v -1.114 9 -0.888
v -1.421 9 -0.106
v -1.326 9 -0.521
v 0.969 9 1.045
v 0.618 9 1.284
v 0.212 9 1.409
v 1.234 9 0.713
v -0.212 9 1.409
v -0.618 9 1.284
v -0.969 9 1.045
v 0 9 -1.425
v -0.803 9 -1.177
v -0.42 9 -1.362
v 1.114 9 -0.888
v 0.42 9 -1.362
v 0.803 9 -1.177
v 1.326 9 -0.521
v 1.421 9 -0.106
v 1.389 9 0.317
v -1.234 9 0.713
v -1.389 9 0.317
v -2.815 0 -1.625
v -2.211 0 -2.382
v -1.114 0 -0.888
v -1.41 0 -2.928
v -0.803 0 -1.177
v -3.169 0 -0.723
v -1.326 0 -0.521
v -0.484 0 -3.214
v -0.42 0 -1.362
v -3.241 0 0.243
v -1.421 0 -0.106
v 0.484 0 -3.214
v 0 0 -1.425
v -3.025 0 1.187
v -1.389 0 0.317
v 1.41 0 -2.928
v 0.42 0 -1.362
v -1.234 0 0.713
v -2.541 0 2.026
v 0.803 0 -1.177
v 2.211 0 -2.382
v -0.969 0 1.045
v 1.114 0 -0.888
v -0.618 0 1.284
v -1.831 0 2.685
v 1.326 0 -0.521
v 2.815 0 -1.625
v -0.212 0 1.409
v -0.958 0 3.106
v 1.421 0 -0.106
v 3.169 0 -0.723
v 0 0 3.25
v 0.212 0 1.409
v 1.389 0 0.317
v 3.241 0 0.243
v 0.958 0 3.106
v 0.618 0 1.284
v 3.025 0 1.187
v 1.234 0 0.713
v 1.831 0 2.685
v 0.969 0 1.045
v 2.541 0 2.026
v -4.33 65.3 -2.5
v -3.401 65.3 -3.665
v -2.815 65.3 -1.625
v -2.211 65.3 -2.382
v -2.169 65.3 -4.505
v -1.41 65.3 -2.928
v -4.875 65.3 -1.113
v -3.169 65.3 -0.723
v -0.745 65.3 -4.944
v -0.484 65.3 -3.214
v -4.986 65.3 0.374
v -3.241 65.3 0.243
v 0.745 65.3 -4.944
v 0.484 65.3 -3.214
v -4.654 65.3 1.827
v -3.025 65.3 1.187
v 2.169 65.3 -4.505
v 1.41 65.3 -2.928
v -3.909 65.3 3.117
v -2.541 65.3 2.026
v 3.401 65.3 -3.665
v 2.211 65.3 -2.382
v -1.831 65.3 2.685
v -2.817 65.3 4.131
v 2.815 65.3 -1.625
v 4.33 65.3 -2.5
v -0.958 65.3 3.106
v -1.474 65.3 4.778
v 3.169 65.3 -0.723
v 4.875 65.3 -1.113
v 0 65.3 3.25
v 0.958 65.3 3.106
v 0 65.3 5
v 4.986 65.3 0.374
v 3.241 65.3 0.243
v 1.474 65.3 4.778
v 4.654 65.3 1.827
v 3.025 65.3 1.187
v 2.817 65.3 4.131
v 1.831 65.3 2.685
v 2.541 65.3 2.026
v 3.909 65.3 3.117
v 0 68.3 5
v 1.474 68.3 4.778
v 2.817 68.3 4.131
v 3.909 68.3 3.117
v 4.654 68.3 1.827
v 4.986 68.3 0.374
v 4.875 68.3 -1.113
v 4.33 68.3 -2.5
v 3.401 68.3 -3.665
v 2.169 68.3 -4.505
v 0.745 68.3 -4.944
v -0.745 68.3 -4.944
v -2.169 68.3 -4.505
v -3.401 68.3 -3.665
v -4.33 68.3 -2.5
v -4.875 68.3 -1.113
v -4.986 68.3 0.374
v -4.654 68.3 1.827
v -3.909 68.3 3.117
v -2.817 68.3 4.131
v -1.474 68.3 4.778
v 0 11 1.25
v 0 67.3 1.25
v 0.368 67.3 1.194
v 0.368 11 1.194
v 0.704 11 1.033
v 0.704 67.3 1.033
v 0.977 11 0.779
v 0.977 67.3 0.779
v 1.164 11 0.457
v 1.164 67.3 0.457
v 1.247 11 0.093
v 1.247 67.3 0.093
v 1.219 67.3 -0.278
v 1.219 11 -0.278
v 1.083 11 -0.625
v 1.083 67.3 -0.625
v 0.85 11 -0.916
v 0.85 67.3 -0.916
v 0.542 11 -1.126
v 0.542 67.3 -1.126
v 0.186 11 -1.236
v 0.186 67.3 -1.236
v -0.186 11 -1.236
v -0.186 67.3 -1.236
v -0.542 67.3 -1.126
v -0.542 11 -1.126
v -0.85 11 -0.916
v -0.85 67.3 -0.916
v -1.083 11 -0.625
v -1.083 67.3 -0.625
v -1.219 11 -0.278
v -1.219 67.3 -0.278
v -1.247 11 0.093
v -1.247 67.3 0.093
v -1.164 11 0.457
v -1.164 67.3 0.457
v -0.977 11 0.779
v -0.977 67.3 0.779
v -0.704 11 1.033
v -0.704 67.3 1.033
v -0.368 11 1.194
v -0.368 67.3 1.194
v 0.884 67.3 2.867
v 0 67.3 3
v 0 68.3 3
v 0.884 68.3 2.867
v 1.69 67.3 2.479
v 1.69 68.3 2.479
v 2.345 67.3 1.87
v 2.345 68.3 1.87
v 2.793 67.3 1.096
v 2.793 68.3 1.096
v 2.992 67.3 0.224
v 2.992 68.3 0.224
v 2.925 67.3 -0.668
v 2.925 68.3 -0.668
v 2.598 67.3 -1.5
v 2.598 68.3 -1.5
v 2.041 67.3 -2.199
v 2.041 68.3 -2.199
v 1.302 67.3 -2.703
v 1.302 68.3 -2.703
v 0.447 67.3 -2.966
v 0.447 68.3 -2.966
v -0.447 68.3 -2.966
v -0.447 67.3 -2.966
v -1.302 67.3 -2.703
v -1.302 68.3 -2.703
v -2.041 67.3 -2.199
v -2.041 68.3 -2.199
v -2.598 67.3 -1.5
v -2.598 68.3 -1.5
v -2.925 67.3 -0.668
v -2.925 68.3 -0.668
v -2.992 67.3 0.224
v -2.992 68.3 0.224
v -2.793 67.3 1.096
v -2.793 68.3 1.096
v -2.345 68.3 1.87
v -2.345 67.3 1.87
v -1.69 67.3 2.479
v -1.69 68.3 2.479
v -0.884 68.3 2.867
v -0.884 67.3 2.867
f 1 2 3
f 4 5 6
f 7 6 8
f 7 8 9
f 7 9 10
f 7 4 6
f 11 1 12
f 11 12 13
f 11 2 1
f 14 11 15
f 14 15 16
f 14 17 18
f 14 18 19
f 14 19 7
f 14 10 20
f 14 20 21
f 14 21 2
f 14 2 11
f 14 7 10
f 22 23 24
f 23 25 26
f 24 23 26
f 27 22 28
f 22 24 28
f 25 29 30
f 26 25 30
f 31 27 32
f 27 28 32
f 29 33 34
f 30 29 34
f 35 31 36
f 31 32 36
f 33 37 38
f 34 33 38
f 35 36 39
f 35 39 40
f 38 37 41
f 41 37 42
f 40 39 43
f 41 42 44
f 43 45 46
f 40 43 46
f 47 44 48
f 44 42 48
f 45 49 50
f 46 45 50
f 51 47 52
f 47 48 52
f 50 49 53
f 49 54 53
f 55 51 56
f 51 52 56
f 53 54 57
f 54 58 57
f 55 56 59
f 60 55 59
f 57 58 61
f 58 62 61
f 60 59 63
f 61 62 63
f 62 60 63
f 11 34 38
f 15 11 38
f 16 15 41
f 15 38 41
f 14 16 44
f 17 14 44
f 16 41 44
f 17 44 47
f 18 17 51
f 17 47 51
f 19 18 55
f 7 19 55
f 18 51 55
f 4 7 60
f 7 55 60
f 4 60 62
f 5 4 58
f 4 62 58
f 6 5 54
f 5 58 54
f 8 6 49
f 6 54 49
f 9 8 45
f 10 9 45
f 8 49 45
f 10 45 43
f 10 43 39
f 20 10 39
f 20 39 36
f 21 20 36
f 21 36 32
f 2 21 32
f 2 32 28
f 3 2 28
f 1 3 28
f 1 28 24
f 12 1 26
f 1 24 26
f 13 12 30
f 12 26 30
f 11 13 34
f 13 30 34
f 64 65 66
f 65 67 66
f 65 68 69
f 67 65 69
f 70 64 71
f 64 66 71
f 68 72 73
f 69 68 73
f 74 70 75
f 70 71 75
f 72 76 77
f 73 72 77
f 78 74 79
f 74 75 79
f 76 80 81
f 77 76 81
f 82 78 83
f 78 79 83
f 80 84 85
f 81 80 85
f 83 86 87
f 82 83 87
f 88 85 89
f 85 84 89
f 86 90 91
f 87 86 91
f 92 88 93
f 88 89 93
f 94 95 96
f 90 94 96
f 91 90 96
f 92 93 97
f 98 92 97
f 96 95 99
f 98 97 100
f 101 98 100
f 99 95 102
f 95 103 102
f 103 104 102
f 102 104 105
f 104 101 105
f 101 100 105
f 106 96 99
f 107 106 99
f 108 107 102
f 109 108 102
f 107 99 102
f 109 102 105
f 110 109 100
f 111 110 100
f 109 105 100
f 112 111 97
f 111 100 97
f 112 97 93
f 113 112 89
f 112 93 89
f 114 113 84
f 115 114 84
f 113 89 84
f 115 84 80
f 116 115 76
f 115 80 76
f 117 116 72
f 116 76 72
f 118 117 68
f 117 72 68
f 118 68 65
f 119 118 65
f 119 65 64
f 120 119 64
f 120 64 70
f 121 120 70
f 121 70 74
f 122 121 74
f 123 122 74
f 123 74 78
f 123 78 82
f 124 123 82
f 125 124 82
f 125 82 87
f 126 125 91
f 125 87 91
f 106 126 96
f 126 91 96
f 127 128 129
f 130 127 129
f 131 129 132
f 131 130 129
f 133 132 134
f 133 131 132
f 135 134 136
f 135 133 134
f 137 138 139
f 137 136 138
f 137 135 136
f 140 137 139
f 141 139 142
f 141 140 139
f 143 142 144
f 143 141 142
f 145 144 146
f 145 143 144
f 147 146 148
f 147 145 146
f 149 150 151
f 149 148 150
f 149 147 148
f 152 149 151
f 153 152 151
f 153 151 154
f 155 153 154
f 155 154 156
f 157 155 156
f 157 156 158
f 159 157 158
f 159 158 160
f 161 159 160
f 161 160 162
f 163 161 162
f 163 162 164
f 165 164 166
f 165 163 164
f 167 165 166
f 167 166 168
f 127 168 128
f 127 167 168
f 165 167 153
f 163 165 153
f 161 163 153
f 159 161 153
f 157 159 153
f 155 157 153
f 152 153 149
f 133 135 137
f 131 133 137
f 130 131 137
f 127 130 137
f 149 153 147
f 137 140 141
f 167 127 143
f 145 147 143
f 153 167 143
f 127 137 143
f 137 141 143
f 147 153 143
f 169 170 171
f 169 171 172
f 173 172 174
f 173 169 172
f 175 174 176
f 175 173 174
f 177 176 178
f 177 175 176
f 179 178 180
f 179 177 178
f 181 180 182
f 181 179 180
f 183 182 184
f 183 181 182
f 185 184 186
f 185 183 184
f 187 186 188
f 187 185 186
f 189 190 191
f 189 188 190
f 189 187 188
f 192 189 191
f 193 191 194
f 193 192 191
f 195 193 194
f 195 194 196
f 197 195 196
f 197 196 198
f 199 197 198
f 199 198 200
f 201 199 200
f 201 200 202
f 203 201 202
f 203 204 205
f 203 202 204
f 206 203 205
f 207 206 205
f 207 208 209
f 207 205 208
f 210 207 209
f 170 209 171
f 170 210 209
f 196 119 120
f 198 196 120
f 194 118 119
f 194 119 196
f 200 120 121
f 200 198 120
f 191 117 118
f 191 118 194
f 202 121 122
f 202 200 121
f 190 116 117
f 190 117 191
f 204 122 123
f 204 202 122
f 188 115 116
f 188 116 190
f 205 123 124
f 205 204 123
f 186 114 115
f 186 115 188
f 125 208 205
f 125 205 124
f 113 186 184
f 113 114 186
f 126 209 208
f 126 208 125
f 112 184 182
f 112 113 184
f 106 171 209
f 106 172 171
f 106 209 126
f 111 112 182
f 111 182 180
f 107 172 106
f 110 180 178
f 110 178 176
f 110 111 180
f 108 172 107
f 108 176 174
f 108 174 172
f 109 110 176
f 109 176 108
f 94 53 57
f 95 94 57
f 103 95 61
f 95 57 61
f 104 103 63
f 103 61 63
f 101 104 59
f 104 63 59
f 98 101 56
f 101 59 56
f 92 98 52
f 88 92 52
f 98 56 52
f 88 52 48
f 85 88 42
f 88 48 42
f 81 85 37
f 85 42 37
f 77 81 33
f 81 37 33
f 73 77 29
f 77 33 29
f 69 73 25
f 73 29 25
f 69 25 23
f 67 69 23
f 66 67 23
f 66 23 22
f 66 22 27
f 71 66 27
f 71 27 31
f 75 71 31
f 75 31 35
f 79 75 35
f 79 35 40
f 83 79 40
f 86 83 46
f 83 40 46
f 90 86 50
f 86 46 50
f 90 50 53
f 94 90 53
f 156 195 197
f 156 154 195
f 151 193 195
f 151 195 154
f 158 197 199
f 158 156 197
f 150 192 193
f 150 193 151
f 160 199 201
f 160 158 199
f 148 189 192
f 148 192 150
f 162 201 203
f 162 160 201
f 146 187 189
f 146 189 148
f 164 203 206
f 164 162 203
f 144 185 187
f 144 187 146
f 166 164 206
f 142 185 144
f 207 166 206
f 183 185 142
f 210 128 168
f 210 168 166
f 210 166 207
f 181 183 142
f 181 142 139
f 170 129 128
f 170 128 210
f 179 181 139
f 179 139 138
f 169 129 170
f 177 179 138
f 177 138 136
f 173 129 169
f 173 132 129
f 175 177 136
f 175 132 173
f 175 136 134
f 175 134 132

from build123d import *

# Parameters (mm, degrees)
SKETCH1_R           = 3.25
BOSS_EXTRUDE1_DEPTH = 65.3
SKETCH2_R           = 5
BOSS_EXTRUDE2_DEPTH = 3
SKETCH3_R           = 1.425
CUT_EXTRUDE1_DEPTH  = 9
SHELL1_T            = -2


with BuildPart() as part:
    # Sketch1 → Boss-Extrude1 (new body)
    with BuildSketch(Plane(origin=(0, 0, 0), x_dir=(1, 0, 0), z_dir=(0, 1, 0))):
        with Locations(Location((0, 0, 0), (0, 0, 270))):
            Circle(SKETCH1_R)
    extrude(amount=BOSS_EXTRUDE1_DEPTH)

    # Sketch2 → Boss-Extrude2 (add)
    with BuildSketch(Plane(origin=(0, 65.3, 0), x_dir=(1, 0, 0), z_dir=(0, 1, 0))):
        with Locations(Location((0, 0, 0), (0, 0, 270))):
            Circle(SKETCH2_R)
    extrude(amount=BOSS_EXTRUDE2_DEPTH)

    # Sketch3 → Cut-Extrude1 (cut)
    with BuildSketch(Plane.XZ):
        with Locations(Location((0, 0, 0), (0, 0, 270))):
            Circle(SKETCH3_R)
    extrude(amount=-CUT_EXTRUDE1_DEPTH, mode=Mode.SUBTRACT)

    # Shell1
    shell1_openings = [part.faces().sort_by_distance(p)[0] for p in [
        (0, 68.3, 0),
    ]]
    offset(amount=SHELL1_T, openings=shell1_openings, kind=Kind.INTERSECTION)


solid = part.part
